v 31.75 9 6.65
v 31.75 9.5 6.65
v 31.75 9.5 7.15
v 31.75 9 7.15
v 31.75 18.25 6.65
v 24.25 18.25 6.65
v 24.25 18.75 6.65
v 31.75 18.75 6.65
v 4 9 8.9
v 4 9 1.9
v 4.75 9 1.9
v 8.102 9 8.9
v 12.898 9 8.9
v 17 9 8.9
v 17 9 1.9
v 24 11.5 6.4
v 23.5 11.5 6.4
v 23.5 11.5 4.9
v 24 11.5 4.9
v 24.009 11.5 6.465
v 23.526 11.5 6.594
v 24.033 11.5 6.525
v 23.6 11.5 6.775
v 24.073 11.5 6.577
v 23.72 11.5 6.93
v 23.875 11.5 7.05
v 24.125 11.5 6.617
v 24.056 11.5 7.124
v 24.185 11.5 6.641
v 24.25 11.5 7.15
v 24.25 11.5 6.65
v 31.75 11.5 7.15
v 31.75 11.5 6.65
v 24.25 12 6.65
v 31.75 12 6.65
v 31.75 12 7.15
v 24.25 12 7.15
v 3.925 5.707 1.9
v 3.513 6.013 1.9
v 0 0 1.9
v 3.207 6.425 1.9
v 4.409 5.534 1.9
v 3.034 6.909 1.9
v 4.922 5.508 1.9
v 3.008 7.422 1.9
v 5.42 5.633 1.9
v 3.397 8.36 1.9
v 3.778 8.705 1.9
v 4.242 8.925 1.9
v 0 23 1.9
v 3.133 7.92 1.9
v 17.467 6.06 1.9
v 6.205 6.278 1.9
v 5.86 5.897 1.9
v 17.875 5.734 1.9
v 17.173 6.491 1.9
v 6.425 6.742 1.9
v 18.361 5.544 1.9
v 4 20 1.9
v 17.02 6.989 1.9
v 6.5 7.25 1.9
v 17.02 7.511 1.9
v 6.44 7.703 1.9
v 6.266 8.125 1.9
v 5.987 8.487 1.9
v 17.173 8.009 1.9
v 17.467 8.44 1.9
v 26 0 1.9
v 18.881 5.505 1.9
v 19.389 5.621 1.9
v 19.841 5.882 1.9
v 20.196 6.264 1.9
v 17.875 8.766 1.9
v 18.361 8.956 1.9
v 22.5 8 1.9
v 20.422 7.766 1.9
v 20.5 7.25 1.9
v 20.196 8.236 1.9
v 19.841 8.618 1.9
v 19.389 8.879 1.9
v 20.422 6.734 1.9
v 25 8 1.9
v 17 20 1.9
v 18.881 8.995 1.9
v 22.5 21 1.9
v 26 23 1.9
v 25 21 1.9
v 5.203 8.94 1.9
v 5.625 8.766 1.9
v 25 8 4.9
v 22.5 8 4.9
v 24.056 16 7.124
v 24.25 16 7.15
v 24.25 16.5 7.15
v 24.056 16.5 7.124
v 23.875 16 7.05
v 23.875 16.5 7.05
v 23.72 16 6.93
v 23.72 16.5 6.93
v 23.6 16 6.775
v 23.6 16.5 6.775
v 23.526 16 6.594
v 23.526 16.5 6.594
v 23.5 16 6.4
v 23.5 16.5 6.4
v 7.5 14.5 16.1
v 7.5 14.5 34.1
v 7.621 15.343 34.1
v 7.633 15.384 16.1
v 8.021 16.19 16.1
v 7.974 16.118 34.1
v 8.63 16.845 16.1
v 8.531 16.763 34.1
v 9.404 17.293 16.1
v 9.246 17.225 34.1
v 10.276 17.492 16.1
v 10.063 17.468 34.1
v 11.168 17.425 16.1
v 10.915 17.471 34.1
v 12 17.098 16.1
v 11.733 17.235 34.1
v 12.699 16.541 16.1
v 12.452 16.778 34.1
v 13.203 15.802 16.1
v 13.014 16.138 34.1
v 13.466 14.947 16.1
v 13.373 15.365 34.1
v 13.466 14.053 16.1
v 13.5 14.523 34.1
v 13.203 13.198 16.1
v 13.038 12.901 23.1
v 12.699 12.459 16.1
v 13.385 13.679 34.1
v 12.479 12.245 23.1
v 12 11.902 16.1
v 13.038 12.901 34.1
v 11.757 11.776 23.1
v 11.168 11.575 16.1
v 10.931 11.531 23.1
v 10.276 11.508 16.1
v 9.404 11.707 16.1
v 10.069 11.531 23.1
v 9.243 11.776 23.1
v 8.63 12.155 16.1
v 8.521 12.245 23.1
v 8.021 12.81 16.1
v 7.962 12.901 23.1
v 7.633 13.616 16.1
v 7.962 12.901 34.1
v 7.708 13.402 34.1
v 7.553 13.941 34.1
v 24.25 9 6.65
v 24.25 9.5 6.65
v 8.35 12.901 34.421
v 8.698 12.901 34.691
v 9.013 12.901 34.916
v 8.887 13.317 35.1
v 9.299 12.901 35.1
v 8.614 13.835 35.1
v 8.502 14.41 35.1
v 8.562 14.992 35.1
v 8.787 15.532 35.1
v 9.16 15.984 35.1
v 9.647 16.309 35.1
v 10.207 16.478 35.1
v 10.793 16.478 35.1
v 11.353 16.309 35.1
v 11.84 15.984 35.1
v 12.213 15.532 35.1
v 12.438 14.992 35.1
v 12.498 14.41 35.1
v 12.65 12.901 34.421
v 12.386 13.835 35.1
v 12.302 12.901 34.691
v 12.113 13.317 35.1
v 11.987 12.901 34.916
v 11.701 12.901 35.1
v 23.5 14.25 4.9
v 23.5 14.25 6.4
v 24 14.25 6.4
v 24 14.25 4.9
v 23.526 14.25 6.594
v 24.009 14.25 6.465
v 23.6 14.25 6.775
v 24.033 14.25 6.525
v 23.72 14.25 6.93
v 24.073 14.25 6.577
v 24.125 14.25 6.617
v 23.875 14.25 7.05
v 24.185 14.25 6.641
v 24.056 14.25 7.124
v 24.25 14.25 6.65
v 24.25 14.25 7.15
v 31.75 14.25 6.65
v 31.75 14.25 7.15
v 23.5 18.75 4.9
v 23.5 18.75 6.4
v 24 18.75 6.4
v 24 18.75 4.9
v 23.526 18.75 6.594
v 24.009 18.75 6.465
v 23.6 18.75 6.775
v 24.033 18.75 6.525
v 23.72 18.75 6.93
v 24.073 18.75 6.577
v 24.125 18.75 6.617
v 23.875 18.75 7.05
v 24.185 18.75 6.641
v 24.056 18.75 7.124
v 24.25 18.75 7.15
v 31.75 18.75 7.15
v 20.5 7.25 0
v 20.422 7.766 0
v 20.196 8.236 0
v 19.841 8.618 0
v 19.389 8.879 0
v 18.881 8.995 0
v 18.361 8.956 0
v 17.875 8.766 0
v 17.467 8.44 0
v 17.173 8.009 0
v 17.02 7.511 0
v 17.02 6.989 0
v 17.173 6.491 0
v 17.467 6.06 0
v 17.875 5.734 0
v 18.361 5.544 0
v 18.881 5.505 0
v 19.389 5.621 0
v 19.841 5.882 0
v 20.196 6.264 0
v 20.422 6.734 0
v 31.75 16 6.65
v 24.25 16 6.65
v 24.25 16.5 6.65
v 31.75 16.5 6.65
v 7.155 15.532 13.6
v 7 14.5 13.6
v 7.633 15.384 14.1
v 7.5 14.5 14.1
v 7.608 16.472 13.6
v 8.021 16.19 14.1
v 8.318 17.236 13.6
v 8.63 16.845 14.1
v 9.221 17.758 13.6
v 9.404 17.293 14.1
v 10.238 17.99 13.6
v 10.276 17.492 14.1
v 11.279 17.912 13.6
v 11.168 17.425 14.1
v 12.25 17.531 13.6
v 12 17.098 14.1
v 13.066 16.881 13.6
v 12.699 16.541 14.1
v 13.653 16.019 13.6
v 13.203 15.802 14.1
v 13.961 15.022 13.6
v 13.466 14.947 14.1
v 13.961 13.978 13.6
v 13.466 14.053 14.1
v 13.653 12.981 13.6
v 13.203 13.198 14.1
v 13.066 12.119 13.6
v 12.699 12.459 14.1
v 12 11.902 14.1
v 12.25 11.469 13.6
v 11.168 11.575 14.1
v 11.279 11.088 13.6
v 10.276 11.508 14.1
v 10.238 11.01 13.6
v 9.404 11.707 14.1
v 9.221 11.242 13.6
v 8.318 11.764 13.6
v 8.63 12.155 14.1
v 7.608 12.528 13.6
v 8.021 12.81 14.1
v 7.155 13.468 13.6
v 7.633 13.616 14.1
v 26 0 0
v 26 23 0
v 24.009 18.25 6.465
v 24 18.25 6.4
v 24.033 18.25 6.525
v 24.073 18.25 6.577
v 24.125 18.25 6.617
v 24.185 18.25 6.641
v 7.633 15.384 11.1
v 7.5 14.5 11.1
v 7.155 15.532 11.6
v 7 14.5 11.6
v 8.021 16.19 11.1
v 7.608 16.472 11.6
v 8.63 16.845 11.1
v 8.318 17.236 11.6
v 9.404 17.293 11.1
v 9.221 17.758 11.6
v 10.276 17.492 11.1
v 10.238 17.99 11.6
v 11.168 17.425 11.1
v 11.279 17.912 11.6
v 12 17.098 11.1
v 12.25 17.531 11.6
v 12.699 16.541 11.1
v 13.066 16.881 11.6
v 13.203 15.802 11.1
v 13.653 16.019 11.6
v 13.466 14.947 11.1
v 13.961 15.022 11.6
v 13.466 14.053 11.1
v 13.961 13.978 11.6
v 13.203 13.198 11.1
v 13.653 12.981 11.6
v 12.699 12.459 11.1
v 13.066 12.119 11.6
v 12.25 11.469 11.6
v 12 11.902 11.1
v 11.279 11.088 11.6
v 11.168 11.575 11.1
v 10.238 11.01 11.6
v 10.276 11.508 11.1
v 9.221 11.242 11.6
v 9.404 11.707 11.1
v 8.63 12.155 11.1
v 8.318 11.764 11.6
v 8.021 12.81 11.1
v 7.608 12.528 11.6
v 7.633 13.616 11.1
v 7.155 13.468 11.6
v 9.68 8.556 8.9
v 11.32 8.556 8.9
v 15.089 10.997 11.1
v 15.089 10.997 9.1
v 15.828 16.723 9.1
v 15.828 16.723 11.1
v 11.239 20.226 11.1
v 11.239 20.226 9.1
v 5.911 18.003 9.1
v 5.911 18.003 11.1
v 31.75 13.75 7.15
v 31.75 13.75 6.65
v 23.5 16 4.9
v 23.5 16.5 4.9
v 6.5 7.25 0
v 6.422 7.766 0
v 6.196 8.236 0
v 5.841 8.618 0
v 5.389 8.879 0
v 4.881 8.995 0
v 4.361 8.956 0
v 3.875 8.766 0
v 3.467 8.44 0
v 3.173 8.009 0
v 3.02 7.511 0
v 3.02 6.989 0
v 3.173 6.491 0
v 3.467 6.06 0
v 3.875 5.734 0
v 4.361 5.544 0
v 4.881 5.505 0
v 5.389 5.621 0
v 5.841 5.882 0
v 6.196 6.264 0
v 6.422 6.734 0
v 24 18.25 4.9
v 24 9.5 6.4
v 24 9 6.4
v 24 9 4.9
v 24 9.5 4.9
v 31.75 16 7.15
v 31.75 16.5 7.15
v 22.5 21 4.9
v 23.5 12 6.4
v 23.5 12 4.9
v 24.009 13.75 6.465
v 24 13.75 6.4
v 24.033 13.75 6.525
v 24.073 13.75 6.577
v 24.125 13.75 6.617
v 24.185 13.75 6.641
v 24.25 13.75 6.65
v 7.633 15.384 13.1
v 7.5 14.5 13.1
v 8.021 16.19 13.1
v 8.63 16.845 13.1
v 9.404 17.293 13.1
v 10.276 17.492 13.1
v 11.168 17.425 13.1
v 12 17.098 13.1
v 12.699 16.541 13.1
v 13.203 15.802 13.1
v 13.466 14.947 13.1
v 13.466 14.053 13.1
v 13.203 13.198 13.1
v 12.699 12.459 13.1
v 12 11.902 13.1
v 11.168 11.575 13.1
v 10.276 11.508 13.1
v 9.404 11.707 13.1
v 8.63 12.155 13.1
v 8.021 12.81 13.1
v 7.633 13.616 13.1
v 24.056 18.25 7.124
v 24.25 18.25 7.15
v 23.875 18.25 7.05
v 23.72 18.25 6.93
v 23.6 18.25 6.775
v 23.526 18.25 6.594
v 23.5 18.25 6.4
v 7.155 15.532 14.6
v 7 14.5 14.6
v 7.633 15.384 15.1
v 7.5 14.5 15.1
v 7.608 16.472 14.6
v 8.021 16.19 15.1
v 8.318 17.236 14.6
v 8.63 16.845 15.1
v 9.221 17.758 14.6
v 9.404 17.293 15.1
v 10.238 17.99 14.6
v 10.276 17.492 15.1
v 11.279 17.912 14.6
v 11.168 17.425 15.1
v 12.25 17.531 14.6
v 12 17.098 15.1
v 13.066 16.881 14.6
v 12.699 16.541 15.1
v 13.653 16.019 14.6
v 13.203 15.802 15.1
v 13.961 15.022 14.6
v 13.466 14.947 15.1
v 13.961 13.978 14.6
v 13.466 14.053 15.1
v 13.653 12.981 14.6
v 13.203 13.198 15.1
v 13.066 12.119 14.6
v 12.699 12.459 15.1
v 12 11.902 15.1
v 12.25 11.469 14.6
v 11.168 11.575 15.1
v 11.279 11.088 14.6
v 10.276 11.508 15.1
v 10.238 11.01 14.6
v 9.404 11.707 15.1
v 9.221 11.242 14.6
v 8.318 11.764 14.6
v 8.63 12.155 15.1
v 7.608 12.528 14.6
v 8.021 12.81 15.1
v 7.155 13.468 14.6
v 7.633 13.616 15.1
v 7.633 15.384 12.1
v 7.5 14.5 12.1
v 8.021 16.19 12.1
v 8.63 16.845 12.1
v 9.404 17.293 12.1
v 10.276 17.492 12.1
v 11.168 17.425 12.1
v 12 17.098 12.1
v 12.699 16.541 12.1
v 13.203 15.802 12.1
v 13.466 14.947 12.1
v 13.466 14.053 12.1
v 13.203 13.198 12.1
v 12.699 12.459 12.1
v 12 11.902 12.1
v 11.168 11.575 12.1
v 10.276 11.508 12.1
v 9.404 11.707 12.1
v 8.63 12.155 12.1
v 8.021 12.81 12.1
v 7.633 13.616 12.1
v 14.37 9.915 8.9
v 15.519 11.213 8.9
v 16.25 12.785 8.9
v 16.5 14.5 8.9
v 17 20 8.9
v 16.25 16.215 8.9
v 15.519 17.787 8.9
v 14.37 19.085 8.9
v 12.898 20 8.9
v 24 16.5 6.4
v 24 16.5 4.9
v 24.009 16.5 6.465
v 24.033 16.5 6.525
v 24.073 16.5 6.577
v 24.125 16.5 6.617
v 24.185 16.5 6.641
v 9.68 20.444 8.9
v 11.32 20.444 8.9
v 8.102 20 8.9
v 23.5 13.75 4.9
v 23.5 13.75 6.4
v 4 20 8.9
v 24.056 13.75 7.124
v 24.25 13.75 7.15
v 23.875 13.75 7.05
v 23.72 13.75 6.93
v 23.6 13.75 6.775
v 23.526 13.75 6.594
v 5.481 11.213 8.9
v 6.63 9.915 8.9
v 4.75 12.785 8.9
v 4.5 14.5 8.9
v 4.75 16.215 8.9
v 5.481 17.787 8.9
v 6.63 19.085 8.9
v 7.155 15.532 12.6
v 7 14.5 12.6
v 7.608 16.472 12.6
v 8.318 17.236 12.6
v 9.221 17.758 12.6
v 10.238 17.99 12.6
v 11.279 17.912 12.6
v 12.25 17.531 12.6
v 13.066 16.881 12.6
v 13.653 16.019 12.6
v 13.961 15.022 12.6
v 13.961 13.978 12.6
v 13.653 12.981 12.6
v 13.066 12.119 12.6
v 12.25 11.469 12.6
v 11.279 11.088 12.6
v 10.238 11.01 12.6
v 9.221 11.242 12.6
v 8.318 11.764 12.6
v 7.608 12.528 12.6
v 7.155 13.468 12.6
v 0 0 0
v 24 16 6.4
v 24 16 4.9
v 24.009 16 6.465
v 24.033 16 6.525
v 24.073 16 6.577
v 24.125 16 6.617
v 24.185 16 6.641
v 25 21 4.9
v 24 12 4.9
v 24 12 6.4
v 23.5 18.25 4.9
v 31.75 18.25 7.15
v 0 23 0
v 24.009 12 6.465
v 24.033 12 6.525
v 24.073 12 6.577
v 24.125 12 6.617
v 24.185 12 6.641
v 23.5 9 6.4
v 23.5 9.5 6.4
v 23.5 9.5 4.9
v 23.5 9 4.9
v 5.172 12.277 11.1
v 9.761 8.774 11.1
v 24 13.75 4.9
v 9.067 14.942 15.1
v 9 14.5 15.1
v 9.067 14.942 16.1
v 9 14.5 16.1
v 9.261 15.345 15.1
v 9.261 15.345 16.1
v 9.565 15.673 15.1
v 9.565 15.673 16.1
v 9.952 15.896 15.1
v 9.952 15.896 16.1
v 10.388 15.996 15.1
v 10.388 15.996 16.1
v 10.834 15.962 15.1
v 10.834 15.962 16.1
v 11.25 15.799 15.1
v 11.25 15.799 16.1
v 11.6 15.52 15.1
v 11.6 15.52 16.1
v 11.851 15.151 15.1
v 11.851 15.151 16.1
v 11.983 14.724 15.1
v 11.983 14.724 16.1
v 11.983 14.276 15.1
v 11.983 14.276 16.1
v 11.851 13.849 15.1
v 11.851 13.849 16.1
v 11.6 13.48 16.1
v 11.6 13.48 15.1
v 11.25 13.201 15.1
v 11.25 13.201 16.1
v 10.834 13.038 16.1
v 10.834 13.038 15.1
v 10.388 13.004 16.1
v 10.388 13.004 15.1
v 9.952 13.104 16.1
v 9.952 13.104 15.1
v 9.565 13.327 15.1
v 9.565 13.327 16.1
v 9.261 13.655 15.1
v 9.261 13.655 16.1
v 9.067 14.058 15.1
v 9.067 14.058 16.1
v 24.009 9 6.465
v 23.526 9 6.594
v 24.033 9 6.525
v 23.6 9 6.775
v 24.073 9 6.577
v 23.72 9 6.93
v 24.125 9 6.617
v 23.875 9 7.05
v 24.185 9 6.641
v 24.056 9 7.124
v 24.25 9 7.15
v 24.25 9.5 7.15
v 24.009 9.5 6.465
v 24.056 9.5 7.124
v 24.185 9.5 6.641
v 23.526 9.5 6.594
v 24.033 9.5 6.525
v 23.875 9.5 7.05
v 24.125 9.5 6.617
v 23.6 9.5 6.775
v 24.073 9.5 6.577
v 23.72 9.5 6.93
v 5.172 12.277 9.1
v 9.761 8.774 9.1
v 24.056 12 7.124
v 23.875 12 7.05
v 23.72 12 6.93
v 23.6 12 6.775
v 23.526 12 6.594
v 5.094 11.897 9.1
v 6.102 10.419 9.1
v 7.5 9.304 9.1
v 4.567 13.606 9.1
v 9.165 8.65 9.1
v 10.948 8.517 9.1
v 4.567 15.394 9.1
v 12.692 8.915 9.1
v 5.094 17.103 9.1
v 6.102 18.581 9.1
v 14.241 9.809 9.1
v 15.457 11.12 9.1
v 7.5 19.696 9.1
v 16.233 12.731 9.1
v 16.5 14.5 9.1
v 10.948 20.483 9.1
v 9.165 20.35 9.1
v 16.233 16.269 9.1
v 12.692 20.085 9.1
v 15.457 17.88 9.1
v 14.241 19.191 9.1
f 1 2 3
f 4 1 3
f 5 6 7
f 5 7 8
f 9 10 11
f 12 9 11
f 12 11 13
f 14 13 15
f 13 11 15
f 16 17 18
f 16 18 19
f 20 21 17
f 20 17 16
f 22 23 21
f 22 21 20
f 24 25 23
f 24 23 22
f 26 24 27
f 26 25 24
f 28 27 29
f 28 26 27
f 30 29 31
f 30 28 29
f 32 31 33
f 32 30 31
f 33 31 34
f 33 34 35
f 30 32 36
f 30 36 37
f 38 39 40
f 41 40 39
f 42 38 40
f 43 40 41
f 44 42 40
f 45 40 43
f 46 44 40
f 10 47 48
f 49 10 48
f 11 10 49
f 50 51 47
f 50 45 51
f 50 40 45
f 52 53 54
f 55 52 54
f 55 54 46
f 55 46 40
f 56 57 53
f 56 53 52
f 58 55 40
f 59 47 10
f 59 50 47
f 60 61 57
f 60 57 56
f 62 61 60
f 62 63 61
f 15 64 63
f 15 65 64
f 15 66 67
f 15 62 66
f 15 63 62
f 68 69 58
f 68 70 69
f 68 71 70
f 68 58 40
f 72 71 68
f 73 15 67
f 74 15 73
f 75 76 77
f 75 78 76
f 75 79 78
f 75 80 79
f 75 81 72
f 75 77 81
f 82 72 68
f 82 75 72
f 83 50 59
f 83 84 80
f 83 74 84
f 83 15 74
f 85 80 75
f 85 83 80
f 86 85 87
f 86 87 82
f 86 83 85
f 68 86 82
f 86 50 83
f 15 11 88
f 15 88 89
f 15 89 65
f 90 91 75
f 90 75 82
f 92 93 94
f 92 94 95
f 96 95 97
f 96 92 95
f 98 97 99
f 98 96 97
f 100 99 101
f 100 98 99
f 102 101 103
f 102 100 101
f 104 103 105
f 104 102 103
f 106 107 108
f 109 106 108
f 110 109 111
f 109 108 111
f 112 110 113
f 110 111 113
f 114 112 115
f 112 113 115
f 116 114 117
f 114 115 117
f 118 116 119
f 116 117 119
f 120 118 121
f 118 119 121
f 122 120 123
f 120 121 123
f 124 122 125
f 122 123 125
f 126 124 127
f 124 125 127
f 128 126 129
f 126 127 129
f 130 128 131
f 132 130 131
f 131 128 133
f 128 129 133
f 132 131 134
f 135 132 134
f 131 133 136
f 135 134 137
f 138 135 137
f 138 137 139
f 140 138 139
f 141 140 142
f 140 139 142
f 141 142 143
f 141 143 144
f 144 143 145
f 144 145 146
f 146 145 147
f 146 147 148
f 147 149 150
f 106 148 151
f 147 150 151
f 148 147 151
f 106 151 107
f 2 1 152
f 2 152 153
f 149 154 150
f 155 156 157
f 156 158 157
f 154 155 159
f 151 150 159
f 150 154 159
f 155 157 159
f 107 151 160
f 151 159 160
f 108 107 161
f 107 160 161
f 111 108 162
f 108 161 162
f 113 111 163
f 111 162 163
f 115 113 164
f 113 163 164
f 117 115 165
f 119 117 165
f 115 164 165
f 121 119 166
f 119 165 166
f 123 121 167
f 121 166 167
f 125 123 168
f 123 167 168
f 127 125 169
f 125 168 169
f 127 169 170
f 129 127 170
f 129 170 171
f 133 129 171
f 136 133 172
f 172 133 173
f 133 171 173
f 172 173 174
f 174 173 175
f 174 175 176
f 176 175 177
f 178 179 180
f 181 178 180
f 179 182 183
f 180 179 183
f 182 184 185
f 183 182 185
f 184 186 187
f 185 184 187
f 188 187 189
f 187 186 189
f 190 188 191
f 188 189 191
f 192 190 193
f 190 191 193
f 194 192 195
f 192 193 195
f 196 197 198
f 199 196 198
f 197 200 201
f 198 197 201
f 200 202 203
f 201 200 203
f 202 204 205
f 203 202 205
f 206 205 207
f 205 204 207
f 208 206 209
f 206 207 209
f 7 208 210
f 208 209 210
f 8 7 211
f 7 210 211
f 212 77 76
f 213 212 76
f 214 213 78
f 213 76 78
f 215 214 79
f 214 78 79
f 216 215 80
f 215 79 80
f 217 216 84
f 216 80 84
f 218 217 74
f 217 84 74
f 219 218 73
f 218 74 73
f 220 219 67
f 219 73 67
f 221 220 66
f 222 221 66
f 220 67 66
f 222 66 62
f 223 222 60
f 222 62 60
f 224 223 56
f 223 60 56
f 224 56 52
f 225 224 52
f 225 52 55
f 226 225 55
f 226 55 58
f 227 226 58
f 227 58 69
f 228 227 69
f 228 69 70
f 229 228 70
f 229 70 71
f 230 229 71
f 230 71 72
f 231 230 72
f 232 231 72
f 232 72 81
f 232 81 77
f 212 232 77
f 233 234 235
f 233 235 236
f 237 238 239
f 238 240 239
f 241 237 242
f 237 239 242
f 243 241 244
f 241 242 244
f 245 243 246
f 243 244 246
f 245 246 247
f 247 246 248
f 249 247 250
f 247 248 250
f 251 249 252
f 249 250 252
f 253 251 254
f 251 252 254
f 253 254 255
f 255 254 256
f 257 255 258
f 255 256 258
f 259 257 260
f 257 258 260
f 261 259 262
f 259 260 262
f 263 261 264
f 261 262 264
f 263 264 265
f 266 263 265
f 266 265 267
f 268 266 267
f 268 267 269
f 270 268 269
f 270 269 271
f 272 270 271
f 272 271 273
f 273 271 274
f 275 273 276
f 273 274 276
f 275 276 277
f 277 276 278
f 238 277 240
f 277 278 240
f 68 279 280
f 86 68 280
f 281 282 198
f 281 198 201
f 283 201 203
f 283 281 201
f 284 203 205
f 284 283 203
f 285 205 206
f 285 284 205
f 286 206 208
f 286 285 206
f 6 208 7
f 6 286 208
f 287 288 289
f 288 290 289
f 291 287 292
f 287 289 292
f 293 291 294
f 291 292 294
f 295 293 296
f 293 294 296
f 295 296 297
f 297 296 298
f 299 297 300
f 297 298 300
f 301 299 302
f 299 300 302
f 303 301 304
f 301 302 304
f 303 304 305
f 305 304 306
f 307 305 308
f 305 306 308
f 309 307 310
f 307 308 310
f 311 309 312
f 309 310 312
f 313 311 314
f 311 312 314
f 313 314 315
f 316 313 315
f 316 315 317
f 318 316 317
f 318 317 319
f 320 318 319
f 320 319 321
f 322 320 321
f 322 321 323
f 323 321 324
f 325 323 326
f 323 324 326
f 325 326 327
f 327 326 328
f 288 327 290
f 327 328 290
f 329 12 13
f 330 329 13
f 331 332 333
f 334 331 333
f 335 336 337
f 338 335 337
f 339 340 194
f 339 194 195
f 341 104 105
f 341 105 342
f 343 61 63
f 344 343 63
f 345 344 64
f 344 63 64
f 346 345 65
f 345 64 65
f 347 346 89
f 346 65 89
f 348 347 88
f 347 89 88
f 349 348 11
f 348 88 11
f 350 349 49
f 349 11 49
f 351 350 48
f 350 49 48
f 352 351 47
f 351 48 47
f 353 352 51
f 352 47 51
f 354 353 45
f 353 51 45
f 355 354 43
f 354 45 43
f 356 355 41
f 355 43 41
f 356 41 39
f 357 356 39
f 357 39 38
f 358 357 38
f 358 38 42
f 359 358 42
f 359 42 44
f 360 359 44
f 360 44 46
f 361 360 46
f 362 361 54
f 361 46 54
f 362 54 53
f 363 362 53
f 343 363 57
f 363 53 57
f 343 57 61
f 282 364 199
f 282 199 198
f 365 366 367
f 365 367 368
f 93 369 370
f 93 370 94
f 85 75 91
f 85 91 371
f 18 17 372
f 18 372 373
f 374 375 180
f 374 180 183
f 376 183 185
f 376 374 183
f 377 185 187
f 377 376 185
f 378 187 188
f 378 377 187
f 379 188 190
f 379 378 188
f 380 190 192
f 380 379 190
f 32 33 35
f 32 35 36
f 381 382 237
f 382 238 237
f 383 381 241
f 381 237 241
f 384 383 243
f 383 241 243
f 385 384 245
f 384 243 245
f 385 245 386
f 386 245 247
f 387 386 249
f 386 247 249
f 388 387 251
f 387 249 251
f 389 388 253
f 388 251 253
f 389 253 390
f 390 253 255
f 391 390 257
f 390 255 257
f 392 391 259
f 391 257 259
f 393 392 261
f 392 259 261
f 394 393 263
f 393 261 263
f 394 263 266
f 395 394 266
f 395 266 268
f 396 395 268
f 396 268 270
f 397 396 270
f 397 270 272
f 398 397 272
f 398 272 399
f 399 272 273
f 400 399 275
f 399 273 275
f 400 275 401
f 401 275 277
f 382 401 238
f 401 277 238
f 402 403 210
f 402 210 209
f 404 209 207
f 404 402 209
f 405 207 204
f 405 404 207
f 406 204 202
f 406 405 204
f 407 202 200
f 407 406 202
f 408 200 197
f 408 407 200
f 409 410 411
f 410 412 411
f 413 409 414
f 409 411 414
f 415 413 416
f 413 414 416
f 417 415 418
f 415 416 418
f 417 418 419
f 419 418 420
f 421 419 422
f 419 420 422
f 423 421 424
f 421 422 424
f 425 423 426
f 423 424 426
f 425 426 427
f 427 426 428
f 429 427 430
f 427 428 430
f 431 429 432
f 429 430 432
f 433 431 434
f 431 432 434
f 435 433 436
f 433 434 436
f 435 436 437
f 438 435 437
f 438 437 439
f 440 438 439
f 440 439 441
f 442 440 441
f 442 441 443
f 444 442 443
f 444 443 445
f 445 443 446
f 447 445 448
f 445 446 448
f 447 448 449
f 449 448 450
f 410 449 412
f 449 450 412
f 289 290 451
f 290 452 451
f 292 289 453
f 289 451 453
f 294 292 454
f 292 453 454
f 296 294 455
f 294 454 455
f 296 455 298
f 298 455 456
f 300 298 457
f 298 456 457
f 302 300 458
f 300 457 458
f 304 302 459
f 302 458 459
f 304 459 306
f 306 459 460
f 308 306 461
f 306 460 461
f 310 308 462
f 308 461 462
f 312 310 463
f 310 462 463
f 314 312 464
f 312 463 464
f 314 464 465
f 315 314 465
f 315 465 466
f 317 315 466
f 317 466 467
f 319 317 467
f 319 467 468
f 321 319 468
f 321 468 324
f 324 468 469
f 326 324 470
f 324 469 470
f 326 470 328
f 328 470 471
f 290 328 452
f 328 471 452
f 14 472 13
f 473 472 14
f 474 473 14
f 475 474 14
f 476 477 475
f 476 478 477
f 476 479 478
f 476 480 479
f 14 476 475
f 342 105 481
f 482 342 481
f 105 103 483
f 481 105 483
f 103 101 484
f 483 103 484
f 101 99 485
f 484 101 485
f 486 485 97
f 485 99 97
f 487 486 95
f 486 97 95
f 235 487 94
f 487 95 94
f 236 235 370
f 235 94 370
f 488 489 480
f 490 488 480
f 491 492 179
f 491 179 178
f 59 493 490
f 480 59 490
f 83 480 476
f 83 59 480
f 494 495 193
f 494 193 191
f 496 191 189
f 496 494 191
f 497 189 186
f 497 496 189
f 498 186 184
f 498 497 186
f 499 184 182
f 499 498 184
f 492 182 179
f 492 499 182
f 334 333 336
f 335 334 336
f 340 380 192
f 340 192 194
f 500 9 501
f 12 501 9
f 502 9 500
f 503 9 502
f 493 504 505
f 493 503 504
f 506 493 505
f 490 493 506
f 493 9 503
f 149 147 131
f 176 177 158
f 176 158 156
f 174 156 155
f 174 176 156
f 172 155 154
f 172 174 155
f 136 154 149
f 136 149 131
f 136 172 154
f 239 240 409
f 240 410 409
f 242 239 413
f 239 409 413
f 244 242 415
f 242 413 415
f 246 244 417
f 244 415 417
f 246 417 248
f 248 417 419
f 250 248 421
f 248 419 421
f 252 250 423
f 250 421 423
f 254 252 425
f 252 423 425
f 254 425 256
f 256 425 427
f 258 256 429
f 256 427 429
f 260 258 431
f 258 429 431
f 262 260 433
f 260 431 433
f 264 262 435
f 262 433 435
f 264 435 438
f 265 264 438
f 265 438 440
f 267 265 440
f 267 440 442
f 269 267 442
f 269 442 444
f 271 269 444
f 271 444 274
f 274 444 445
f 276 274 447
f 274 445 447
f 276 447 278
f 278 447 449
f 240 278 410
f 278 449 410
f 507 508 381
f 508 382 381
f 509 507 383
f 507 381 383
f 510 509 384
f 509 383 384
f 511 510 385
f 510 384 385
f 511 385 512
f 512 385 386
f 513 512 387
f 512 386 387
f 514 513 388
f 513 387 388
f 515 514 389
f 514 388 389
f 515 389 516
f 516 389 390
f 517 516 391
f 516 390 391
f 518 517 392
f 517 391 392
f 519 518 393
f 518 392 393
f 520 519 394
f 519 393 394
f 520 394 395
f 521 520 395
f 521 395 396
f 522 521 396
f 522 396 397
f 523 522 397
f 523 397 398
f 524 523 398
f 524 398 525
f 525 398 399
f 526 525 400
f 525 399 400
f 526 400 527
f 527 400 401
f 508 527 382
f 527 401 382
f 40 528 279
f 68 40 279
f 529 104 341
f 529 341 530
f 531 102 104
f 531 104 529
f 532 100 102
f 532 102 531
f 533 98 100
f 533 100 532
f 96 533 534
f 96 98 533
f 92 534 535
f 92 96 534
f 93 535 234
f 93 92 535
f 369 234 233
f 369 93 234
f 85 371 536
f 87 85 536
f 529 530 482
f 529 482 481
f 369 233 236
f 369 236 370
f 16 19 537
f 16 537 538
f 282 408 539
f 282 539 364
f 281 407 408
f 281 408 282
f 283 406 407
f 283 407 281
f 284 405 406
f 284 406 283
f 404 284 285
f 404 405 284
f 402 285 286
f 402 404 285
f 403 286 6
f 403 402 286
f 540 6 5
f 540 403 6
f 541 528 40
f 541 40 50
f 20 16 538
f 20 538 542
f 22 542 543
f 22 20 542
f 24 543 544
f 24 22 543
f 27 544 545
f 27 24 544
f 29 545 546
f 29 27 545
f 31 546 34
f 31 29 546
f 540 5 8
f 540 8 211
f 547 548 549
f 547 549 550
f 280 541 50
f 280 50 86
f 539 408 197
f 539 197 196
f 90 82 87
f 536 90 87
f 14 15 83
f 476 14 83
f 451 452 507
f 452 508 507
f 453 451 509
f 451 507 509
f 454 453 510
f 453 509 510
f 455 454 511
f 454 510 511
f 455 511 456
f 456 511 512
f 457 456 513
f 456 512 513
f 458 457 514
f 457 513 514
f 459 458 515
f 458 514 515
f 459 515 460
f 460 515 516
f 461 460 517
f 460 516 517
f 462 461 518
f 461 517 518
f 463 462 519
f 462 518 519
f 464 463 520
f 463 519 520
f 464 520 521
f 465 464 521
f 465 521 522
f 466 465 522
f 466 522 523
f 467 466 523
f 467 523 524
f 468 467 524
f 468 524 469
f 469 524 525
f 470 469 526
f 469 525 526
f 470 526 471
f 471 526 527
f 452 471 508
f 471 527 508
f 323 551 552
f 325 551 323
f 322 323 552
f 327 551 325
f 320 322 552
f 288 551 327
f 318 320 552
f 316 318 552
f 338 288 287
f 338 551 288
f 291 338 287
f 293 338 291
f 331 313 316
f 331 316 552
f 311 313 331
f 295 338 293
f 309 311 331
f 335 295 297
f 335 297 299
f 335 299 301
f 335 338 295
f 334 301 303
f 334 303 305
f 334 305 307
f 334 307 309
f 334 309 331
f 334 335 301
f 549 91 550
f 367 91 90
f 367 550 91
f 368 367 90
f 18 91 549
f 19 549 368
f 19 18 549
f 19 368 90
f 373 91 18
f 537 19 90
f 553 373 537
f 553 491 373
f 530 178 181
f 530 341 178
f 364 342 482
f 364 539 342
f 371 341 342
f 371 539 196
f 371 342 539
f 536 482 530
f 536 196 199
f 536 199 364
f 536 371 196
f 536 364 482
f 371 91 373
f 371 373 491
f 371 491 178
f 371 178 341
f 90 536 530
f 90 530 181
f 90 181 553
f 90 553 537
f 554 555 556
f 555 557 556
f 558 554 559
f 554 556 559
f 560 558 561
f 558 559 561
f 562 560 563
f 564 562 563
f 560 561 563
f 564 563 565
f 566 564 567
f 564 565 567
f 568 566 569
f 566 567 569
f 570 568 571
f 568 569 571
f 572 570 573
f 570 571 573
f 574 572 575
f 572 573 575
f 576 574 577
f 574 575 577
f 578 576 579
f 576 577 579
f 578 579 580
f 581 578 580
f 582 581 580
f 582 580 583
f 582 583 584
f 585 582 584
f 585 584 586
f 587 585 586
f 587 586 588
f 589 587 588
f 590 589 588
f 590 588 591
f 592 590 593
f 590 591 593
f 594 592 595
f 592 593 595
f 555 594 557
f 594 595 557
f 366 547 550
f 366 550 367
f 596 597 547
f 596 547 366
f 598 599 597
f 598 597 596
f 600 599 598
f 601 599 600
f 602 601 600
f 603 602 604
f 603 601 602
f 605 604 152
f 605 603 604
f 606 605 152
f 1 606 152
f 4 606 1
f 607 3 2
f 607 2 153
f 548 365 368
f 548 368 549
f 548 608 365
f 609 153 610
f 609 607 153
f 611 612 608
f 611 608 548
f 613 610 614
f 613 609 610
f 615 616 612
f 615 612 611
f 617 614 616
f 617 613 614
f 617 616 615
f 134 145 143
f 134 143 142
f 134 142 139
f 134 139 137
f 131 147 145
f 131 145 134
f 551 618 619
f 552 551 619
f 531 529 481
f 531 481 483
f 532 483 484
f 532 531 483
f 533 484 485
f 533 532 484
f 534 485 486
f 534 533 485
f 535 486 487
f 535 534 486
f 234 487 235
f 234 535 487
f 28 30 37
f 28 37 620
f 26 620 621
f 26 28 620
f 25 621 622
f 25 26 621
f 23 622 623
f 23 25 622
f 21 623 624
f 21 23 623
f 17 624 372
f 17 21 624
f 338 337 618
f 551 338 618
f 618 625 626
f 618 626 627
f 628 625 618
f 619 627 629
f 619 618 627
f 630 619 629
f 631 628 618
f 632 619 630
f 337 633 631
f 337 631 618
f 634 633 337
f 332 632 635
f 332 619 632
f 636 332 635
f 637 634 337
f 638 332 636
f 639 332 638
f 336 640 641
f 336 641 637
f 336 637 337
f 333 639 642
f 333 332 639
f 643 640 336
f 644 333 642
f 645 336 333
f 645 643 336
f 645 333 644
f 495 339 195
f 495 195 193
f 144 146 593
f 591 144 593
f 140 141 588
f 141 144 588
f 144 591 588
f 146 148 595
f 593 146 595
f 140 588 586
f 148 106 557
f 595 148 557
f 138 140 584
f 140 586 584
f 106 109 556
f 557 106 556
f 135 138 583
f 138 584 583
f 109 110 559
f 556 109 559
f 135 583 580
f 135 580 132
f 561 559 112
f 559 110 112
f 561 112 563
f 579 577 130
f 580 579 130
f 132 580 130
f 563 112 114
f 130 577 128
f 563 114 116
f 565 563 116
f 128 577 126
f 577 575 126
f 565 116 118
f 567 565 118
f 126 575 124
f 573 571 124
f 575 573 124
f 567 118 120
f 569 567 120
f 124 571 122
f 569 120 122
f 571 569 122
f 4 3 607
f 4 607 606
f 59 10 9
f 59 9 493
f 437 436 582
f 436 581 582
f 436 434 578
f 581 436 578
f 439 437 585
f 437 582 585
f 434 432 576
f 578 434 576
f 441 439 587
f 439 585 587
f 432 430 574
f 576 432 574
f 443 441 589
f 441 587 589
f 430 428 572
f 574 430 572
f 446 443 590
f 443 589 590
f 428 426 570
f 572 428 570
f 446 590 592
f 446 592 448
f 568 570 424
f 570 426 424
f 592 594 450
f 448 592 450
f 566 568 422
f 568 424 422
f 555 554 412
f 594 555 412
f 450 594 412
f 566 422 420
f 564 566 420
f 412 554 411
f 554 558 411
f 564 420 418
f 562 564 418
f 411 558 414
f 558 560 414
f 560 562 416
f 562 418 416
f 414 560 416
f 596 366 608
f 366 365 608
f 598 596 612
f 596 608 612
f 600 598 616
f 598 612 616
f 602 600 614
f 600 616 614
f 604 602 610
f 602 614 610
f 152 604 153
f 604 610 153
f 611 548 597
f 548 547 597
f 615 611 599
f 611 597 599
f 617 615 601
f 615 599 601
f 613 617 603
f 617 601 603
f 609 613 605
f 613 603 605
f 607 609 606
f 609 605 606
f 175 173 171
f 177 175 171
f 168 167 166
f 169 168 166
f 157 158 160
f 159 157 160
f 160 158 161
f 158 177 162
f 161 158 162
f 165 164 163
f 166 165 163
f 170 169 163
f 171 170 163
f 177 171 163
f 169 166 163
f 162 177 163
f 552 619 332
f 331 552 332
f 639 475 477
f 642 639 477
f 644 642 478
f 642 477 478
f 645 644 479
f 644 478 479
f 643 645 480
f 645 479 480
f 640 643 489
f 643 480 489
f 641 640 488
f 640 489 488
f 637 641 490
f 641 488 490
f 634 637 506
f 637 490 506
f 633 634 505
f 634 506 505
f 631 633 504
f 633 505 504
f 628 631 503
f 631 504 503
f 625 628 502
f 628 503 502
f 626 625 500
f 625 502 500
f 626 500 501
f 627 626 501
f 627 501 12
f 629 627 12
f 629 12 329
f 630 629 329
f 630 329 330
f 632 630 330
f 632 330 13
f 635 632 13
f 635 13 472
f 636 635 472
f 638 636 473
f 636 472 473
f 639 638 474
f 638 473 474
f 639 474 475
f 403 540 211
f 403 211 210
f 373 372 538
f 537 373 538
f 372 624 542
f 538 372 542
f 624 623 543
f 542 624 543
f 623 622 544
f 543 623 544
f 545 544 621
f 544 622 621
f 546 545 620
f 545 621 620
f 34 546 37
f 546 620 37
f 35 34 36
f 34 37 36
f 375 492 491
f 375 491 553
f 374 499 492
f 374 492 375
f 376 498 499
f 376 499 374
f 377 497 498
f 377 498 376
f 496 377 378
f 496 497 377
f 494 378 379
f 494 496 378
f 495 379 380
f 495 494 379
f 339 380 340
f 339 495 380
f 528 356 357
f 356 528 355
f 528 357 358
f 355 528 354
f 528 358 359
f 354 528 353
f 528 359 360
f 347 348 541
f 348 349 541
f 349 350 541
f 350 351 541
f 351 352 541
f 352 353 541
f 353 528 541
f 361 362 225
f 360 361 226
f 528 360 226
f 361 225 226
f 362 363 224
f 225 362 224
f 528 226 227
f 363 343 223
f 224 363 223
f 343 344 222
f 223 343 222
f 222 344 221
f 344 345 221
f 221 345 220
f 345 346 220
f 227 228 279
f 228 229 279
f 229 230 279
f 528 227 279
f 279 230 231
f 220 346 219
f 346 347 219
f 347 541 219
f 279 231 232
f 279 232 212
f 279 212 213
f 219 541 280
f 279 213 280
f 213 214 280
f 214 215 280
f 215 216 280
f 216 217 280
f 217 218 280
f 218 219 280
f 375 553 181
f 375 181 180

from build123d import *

# Parameters (mm, degrees)
F0_W      = 26
F0_H      = 23
F1_DEPTH  = 1.9
F3_W      = 13
F3_H      = 11
F4_DEPTH  = 7
F5_R      = 6
F6_DEPTH  = 0.2
F8_DEPTH  = 2
F14_W     = 6.9831185974
F14_H     = 2.036742866
F15_DEPTH = 12
F16_SIZE  = 1
F17_W     = 2.5
F17_H     = 13
F18_DEPTH = 3
F20_R     = 1.75
F21_DEPTH = 2
F23_W     = 0.5
F23_H     = 0.5
F27_DEPTH = 0.5
F30_DEPTH = 0.5
F33_DEPTH = 0.5
F36_DEPTH = 0.5


with BuildPart() as f1:
    # F0 (on Top) → F1 (new body)
    with BuildSketch(Plane.XY):
        with Locations((13, 11.5)):
            Rectangle(F0_W, F0_H)
    extrude(amount=F1_DEPTH)

    # F3 (on face) → F4 (join)
    with BuildSketch(Plane.XY.offset(1.9)):
        with Locations((10.5, 14.5)):
            Rectangle(F3_W, F3_H)
    extrude(amount=F4_DEPTH)

    # F5 (on face) → F6 (join)
    with BuildSketch(Plane.XY.offset(8.9)):
        with Locations((10.5, 14.5)):
            Circle(F5_R)
    extrude(amount=F6_DEPTH)

    # F7 (on face) → F8 (join)
    with BuildSketch(Plane.XY.offset(9.1)):
        Polygon((5.1715213938, 12.277242911), (9.7607248024, 8.774023619), (15.0892034086, 10.996780708), (15.8284786062, 16.722757089), (11.2392751976, 20.225976381), (5.9107965914, 18.003219292), align=None)
    extrude(amount=F8_DEPTH)

    # F10 (on offset) → F11 (revolve)
    with BuildSketch(Plane(origin=(0, 14.5, 0), x_dir=(-1, 0, 0), z_dir=(0, 1, 0))):
        Polygon((-7.5, 11.1), (-7, 11.6), (-7.5, 12.1), (-7, 12.6), (-7.5, 13.1), (-7, 13.6), (-7.5, 14.1), (-7, 14.6), (-7.5, 15.1), (-10.5, 15.1), (-10.5, 11.1), align=None)
    revolve(axis=Axis((10.5, 14.5, 17.7832646295), (0, 0, -1)))

    # F12 (on offset) → F13 (revolve)
    with BuildSketch(Plane(origin=(0, 14.5, 0), x_dir=(-1, 0, 0), z_dir=(0, 1, 0))):
        Polygon((-7.5, 35.1), (-10.5, 35.1), (-10.5, 15.1), (-9, 15.1), (-9, 16.1), (-7.5, 16.1), align=None)
    revolve(axis=Axis((10.5, 14.5, 21.5967431704), (0, 0, -1)))

    # F14 (on face) → F15 (cut)
    with BuildSketch(Plane.XY.offset(35.1)):
        with Locations((10.4028915521, 11.8824467063)):
            Rectangle(F14_W, F14_H)
    extrude(amount=-F15_DEPTH, mode=Mode.SUBTRACT)

    # F16
    f16_edges = [f1.edges().sort_by_distance(p)[0] for p in [
        (11.332258, 17.382247, 35.1),
    ]]
    chamfer(f16_edges, length=F16_SIZE)

    # F17 (on face) → F18 (join)
    with BuildSketch(Plane.XY.offset(1.9)):
        with Locations((23.75, 14.5)):
            Rectangle(F17_W, F17_H)
    extrude(amount=F18_DEPTH)

    # F20 (on face) → F21 (cut)
    with BuildSketch(Plane.XY.offset(1.9)):
        with Locations((4.75, 7.25)):
            Circle(F20_R)
        with Locations((18.75, 7.25)):
            Circle(F20_R)
    extrude(amount=-F21_DEPTH, mode=Mode.SUBTRACT)

    # F24: sweep along a path in F22
    with BuildLine(Plane.XZ.offset(-9.25)) as f24_path:
        Line((23.75, 4.9), (23.75, 6.4))
        ThreePointArc((23.75, 6.4), (23.8964466094, 6.7535533906), (24.25, 6.9))
        Line((24.25, 6.9), (31.75, 6.9))
    # F23 (on face) → F24 (sweep)
    with BuildSketch(Plane.XY.offset(4.9)):
        with Locations((23.75, 9.25)):
            Rectangle(F23_W, F23_H)
    sweep(path=f24_path.line)

    # F26 (on offset) → F27 (join)
    with BuildSketch(Plane.XZ.offset(-11.5)):
        with BuildLine():
            Line((23.5, 6.4), (23.5, 4.9))
            Line((23.5, 4.9), (24, 4.9))
            Line((24, 4.9), (24, 6.4))
            ThreePointArc((24, 6.4), (24.0732233047, 6.5767766953), (24.25, 6.65))
            Line((24.25, 6.65), (31.75, 6.65))
            Line((31.75, 6.65), (31.75, 7.15))
            Line((31.75, 7.15), (24.25, 7.15))
            ThreePointArc((24.25, 7.15), (23.7196699141, 6.9303300859), (23.5, 6.4))
        make_face()
    extrude(amount=-F27_DEPTH)

    # F29 (on offset) → F30 (join)
    with BuildSketch(Plane.XZ.offset(-13.75)):
        with BuildLine():
            Line((23.5, 6.4), (23.5, 4.9))
            Line((23.5, 4.9), (24, 4.9))
            Line((24, 4.9), (24, 6.4))
            ThreePointArc((24, 6.4), (24.0732233047, 6.5767766953), (24.25, 6.65))
            Line((24.25, 6.65), (31.75, 6.65))
            Line((31.75, 6.65), (31.75, 7.15))
            Line((31.75, 7.15), (24.25, 7.15))
            ThreePointArc((24.25, 7.15), (23.7196699141, 6.9303300859), (23.5, 6.4))
        make_face()
    extrude(amount=-F30_DEPTH)

    # F32 (on offset) → F33 (join)
    with BuildSketch(Plane.XZ.offset(-16)):
        with BuildLine():
            Line((31.75, 7.15), (24.25, 7.15))
            ThreePointArc((24.25, 7.15), (23.7196699141, 6.9303300859), (23.5, 6.4))
            Line((23.5, 6.4), (23.5, 4.9))
            Line((23.5, 4.9), (24, 4.9))
            Line((24, 4.9), (24, 6.4))
            ThreePointArc((24, 6.4), (24.0732233047, 6.5767766953), (24.25, 6.65))
            Line((24.25, 6.65), (31.75, 6.65))
            Line((31.75, 6.65), (31.75, 7.15))
        make_face()
    extrude(amount=-F33_DEPTH)

    # F35 (on offset) → F36 (join)
    with BuildSketch(Plane.XZ.offset(-18.25)):
        with BuildLine():
            ThreePointArc((24, 6.4), (24.0732233047, 6.5767766953), (24.25, 6.65))
            Line((24.25, 6.65), (31.75, 6.65))
            Line((31.75, 6.65), (31.75, 7.15))
            Line((31.75, 7.15), (24.25, 7.15))
            ThreePointArc((24.25, 7.15), (23.7196699141, 6.9303300859), (23.5, 6.4))
            Line((23.5, 6.4), (23.5, 4.9))
            Line((23.5, 4.9), (24, 4.9))
            Line((24, 4.9), (24, 6.4))
        make_face()
    extrude(amount=-F36_DEPTH)


solid = f1.part
